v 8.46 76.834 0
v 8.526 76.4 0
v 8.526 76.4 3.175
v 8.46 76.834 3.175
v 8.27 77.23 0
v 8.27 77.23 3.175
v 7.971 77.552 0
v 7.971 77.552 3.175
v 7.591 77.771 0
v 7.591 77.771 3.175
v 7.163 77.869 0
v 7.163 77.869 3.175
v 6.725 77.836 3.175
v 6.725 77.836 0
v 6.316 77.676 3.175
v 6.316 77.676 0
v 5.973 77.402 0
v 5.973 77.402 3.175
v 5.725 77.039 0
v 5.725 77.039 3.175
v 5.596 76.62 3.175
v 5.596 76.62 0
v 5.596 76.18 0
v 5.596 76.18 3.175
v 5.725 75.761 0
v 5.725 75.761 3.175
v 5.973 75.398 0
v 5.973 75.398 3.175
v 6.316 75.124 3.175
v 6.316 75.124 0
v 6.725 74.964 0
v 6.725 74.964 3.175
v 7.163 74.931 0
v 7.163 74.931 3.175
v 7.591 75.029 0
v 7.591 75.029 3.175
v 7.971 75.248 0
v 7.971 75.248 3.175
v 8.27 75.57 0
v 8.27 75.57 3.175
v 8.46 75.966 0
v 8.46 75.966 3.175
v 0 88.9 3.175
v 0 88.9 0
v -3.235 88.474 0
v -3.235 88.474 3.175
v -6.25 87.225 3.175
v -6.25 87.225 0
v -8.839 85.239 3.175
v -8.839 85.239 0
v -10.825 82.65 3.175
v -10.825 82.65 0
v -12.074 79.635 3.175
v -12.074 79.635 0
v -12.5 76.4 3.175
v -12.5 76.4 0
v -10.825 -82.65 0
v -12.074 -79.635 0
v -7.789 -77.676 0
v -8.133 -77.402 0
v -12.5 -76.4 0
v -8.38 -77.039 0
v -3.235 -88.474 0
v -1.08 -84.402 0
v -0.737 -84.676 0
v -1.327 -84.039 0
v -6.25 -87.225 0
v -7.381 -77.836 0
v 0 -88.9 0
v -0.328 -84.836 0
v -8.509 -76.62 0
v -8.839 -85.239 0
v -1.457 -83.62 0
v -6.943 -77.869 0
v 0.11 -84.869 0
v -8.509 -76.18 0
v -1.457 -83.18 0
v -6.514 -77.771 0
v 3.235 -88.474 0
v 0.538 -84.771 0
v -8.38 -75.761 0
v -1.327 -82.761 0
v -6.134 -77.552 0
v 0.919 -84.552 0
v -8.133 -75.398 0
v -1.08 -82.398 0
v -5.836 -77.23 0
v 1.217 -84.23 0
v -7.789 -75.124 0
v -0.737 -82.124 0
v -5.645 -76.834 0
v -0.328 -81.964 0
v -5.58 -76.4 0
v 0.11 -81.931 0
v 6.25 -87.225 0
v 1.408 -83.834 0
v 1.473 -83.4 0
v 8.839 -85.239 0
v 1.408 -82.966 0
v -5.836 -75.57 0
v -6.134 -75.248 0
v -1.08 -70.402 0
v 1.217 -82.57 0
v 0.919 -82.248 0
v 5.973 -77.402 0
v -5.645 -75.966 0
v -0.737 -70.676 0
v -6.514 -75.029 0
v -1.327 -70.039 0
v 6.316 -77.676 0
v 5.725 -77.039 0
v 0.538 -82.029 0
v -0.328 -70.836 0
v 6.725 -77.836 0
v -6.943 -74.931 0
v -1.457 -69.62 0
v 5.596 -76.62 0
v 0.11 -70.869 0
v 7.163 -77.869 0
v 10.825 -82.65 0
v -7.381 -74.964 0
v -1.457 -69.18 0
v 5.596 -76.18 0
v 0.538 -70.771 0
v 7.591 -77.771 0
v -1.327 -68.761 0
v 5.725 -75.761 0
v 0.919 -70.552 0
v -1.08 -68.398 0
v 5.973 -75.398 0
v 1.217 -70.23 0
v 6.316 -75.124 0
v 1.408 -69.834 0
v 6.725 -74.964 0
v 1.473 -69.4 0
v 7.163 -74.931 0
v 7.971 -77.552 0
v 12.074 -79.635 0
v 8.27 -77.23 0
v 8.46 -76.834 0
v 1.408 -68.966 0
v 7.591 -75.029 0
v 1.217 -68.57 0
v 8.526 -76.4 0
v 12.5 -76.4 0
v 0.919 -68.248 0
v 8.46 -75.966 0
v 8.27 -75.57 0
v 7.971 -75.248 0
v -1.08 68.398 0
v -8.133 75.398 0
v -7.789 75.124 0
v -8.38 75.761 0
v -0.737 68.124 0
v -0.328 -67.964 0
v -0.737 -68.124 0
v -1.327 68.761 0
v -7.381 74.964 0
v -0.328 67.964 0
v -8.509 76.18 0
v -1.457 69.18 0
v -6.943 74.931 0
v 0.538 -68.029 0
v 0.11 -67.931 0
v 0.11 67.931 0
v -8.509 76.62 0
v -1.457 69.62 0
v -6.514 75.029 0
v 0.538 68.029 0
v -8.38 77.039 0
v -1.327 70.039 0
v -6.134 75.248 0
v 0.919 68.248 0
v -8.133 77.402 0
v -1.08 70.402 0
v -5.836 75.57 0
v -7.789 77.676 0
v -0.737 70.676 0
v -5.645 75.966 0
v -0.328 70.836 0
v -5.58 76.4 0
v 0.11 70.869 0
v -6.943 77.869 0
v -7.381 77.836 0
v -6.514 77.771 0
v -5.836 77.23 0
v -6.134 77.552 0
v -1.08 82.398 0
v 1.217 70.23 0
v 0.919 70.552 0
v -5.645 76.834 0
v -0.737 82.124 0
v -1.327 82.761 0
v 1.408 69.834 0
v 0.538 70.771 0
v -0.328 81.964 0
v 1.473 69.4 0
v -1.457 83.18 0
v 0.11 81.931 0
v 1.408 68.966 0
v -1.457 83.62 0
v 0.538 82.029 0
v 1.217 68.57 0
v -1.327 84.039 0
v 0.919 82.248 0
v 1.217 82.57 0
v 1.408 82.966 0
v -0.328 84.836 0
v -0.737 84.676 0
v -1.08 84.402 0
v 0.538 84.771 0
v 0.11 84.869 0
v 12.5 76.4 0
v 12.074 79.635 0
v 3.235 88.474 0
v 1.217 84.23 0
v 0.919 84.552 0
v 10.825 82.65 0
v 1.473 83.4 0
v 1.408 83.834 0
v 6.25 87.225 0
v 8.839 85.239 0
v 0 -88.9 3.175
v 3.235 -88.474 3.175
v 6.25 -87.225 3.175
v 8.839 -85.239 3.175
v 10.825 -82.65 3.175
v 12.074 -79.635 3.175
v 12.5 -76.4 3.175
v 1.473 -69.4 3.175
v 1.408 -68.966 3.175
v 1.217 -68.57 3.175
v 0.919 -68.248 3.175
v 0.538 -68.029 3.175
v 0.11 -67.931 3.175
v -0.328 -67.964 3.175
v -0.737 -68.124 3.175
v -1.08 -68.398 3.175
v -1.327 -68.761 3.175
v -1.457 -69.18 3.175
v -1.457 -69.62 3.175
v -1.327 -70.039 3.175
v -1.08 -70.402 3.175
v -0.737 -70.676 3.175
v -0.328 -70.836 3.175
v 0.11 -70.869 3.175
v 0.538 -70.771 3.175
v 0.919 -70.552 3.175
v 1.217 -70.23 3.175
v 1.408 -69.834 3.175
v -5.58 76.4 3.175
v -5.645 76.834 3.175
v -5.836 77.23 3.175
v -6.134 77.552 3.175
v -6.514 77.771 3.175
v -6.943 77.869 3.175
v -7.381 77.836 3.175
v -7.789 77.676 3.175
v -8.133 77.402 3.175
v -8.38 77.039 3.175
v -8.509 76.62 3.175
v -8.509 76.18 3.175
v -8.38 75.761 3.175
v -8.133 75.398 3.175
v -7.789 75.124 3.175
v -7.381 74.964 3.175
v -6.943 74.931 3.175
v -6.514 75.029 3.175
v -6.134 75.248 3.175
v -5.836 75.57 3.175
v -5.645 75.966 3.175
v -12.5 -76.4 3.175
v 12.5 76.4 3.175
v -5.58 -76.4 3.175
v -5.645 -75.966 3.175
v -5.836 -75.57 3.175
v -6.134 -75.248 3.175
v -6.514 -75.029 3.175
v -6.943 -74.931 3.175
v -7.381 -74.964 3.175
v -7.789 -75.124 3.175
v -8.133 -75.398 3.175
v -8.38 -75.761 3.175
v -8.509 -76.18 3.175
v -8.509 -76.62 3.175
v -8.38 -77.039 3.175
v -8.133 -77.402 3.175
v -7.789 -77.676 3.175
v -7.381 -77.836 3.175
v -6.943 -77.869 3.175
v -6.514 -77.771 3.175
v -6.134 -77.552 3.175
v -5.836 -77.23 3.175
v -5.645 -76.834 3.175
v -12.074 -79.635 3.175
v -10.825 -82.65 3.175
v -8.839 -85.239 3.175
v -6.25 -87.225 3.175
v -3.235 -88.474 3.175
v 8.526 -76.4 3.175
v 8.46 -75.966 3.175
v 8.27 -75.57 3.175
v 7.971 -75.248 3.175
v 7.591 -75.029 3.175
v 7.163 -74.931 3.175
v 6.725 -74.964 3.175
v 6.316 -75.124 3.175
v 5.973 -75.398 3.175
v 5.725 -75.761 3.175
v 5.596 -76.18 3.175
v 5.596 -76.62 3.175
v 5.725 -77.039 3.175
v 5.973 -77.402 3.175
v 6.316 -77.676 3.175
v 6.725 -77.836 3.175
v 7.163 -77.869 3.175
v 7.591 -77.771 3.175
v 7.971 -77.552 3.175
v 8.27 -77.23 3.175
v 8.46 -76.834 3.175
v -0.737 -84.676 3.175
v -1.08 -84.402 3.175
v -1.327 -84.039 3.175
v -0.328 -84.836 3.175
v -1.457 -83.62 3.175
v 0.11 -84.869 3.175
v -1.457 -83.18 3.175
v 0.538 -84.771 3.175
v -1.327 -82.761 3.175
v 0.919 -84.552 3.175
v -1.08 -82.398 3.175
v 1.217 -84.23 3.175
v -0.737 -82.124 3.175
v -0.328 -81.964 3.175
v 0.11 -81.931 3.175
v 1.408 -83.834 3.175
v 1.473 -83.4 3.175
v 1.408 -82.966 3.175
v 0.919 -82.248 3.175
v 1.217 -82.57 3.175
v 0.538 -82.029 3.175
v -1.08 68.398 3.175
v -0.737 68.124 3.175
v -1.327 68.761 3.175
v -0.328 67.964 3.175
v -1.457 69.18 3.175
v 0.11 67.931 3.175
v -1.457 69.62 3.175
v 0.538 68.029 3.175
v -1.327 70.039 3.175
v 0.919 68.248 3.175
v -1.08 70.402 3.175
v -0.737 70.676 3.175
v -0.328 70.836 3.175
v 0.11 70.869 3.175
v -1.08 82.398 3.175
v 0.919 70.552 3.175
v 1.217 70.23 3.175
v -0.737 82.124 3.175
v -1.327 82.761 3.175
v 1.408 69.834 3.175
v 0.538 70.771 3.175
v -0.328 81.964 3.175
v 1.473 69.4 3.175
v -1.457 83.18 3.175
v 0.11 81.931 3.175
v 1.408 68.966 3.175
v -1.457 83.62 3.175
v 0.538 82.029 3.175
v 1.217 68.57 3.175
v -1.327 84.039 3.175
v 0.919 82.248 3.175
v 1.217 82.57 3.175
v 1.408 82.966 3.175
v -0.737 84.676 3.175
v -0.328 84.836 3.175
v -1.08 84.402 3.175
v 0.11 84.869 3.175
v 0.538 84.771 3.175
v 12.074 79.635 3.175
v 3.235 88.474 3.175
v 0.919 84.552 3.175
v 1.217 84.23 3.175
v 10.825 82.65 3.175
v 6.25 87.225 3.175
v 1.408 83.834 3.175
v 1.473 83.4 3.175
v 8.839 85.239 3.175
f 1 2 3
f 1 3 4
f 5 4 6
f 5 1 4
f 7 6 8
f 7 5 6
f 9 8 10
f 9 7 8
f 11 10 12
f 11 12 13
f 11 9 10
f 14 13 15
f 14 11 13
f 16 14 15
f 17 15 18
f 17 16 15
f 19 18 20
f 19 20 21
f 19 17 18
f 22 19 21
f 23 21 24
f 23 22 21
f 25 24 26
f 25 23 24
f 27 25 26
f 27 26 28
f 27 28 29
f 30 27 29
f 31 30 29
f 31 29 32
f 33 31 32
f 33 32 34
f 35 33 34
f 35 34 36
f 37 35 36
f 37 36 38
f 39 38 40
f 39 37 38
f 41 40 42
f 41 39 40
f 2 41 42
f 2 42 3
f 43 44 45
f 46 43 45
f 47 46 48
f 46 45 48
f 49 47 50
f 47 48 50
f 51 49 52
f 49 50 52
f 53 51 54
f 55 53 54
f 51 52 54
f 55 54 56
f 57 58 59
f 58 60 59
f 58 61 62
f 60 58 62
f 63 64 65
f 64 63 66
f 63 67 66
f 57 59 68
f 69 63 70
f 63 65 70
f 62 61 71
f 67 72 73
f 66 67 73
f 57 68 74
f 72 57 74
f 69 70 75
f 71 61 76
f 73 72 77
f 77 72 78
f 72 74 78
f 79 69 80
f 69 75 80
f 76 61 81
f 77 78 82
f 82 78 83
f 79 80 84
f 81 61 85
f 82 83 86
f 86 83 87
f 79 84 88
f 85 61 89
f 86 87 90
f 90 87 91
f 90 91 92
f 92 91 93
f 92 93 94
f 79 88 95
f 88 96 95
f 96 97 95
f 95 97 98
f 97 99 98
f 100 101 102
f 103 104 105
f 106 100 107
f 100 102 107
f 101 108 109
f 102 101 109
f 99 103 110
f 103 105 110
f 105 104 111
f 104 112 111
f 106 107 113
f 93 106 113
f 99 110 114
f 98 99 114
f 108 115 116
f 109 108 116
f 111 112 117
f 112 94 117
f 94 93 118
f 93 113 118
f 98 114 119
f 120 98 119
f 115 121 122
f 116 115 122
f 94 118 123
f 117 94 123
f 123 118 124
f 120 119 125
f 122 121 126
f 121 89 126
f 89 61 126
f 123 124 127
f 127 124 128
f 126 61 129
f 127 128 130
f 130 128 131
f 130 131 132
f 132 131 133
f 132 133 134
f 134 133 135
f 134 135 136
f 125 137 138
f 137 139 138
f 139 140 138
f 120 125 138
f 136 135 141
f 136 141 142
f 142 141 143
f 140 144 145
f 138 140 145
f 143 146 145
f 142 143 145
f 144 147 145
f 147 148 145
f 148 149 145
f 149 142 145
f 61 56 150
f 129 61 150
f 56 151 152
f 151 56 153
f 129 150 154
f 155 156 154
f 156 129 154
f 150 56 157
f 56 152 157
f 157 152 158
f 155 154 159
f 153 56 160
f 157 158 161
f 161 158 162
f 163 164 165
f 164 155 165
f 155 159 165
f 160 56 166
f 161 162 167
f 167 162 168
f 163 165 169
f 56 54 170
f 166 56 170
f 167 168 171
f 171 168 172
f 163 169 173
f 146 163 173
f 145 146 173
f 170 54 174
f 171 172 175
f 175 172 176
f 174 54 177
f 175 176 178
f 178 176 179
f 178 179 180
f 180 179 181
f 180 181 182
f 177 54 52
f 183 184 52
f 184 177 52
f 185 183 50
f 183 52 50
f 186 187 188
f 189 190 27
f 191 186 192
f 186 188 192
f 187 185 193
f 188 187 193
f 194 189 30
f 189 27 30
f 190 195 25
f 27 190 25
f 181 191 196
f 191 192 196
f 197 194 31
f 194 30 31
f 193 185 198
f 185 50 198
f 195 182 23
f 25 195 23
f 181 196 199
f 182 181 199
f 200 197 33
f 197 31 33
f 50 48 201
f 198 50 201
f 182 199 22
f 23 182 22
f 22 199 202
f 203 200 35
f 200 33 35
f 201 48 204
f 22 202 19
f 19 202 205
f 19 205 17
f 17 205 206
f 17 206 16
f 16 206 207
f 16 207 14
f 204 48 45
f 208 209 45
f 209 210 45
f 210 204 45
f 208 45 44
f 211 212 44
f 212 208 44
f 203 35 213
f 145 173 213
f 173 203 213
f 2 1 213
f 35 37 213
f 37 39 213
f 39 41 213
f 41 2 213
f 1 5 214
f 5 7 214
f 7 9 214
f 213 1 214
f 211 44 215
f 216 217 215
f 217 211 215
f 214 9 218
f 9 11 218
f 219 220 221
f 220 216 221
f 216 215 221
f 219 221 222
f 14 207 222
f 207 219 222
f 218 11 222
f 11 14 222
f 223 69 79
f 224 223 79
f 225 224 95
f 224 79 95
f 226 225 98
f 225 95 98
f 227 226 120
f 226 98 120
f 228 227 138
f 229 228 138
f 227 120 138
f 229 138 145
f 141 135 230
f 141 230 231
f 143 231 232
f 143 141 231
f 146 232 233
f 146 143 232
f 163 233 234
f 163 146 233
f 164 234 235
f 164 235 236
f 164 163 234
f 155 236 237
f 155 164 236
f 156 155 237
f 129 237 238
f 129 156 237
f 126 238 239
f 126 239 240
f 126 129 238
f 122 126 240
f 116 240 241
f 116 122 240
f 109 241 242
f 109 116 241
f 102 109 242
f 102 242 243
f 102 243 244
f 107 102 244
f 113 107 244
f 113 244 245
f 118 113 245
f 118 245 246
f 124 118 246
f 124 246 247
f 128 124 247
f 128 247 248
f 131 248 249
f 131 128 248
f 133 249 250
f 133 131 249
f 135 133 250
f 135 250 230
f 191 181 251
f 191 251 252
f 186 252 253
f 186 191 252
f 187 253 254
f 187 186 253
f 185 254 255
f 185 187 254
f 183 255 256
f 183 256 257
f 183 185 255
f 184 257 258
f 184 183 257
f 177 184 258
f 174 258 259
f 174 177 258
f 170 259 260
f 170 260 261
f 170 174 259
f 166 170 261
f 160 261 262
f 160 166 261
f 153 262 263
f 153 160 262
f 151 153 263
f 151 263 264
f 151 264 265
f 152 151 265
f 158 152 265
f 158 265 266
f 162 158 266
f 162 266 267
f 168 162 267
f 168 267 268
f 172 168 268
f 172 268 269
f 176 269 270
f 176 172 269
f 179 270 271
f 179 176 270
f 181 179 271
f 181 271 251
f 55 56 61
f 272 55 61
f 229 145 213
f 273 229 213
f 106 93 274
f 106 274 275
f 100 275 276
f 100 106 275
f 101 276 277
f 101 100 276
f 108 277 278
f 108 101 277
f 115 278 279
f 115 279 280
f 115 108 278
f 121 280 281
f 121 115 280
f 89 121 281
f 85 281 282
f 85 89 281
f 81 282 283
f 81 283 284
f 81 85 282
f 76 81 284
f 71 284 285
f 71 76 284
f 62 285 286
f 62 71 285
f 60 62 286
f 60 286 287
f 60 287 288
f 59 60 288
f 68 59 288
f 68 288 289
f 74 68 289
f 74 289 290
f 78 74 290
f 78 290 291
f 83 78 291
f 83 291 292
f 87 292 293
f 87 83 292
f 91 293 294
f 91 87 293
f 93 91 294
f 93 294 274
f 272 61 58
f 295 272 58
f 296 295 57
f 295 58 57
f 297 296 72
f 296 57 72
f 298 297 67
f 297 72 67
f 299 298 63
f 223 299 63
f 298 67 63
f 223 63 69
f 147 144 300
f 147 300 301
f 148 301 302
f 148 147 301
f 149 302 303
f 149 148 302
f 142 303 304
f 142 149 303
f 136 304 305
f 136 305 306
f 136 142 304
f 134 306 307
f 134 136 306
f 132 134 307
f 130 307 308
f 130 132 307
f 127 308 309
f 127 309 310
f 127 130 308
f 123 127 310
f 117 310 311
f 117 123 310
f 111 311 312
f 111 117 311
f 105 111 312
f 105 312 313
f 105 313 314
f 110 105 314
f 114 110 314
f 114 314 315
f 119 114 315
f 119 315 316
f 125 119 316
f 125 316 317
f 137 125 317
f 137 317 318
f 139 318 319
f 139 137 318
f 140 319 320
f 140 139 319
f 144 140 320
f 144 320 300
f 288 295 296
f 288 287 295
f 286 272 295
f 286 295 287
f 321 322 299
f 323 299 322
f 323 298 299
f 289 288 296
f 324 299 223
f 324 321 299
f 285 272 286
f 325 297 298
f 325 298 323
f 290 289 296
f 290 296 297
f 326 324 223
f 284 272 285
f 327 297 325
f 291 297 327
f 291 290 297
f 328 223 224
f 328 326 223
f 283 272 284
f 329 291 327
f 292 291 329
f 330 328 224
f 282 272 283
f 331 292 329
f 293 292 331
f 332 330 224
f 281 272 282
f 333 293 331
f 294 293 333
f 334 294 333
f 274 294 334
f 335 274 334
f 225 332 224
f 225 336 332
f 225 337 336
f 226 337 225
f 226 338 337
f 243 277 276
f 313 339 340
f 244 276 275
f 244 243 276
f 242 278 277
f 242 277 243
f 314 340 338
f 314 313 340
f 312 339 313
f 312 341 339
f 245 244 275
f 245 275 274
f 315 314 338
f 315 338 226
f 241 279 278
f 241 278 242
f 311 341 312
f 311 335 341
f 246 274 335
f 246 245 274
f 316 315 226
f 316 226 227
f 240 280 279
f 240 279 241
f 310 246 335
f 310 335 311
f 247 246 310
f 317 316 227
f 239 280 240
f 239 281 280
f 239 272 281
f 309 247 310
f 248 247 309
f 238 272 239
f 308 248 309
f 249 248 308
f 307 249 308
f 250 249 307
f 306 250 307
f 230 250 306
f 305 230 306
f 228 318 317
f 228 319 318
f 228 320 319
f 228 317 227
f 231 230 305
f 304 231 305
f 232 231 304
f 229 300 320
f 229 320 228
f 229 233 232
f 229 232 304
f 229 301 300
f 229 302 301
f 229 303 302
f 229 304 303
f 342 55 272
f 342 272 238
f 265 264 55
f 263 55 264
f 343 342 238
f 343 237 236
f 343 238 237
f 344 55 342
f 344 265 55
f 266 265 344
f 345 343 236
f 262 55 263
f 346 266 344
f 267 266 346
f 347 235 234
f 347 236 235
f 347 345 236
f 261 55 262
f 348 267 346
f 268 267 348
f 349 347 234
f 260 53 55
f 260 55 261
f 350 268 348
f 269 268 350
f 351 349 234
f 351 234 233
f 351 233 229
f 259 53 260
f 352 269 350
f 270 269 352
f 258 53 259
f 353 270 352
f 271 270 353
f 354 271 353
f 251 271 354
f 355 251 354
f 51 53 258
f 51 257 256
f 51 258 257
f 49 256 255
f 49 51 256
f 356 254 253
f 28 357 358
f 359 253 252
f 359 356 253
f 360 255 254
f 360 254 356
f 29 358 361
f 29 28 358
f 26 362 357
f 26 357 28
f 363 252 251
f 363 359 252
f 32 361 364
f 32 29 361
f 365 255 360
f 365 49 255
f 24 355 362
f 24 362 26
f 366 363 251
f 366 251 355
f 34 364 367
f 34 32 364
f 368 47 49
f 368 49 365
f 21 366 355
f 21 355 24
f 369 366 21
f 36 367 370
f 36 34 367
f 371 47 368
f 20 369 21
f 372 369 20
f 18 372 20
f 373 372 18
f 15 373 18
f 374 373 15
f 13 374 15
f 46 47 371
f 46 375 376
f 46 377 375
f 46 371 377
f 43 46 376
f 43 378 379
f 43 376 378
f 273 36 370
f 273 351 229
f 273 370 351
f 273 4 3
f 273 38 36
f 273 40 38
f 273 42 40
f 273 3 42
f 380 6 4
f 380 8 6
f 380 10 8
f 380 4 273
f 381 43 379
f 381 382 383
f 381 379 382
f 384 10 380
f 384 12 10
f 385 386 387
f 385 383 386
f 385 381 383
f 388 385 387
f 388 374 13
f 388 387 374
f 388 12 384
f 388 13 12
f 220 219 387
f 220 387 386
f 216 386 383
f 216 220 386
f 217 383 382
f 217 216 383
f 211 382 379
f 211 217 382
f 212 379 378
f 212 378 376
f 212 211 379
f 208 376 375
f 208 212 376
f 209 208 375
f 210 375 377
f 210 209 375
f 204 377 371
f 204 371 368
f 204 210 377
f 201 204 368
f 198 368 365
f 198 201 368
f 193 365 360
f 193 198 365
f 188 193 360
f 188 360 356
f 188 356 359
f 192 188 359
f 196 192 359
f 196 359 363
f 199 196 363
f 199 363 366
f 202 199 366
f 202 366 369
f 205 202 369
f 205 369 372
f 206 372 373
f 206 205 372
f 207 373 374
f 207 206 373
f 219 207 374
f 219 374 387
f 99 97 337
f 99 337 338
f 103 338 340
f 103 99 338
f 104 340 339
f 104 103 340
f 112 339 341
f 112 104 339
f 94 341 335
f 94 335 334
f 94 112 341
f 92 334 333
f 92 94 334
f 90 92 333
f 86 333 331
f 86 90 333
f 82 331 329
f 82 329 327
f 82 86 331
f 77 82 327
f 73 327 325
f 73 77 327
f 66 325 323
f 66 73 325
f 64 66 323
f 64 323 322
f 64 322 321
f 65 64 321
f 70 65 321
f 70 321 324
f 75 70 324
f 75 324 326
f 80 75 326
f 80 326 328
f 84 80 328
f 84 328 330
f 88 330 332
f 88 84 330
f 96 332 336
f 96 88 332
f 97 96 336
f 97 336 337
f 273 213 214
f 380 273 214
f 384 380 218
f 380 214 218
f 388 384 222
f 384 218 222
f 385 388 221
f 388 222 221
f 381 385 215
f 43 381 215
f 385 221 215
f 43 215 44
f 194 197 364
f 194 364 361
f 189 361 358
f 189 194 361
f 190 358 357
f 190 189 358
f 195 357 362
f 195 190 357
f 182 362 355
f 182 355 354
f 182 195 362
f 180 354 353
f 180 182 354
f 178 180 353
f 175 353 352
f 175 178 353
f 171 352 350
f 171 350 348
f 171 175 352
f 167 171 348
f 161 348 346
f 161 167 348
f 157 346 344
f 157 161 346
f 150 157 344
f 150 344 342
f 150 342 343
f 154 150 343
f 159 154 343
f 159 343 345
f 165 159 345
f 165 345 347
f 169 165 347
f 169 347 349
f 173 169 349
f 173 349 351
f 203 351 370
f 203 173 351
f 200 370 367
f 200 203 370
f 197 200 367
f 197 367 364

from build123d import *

# Parameters (mm, degrees)
F0_R     = 1.4732
F1_DEPTH = 3.175


# Not quite as in the source:
# - a length typed as a fraction of an inch, garbled in the dataset ("3 / 203.2 mm" for 3/8 in), is restored


with BuildPart() as f1:
    # F0 (on Top) → F1 (new body)
    with BuildSketch(Plane.XY):
        with BuildLine():
            Line((12.5, -76.4), (12.5, 76.4))
            ThreePointArc((12.5, 76.4), (8.8388347648, 85.2388347648), (0, 88.9))
            ThreePointArc((0, 88.9), (-8.8388347648, 85.2388347648), (-12.5, 76.4))
            Line((-12.5, 76.4), (-12.5, -76.4))
            ThreePointArc((-12.5, -76.4), (-8.8388347648, -85.2388347648), (0, -88.9))
            ThreePointArc((0, -88.9), (8.8388347648, -85.2388347648), (12.5, -76.4))
        make_face()
        with Locations((-7.0527177304, -76.4)):
            Circle(F0_R, mode=Mode.SUBTRACT)
        with Locations((0, -83.4)):
            Circle(F0_R, mode=Mode.SUBTRACT)
        with Locations((0, -69.4)):
            Circle(F0_R, mode=Mode.SUBTRACT)
        with Locations((7.0527177304, -76.4)):
            Circle(F0_R, mode=Mode.SUBTRACT)
        with Locations((-7.0527177304, 76.4)):
            Circle(F0_R, mode=Mode.SUBTRACT)
        with Locations((0, 69.4)):
            Circle(F0_R, mode=Mode.SUBTRACT)
        with Locations((0, 83.4)):
            Circle(F0_R, mode=Mode.SUBTRACT)
        with Locations((7.0527177304, 76.4)):
            Circle(F0_R, mode=Mode.SUBTRACT)
    extrude(amount=F1_DEPTH)


solid = f1.part
